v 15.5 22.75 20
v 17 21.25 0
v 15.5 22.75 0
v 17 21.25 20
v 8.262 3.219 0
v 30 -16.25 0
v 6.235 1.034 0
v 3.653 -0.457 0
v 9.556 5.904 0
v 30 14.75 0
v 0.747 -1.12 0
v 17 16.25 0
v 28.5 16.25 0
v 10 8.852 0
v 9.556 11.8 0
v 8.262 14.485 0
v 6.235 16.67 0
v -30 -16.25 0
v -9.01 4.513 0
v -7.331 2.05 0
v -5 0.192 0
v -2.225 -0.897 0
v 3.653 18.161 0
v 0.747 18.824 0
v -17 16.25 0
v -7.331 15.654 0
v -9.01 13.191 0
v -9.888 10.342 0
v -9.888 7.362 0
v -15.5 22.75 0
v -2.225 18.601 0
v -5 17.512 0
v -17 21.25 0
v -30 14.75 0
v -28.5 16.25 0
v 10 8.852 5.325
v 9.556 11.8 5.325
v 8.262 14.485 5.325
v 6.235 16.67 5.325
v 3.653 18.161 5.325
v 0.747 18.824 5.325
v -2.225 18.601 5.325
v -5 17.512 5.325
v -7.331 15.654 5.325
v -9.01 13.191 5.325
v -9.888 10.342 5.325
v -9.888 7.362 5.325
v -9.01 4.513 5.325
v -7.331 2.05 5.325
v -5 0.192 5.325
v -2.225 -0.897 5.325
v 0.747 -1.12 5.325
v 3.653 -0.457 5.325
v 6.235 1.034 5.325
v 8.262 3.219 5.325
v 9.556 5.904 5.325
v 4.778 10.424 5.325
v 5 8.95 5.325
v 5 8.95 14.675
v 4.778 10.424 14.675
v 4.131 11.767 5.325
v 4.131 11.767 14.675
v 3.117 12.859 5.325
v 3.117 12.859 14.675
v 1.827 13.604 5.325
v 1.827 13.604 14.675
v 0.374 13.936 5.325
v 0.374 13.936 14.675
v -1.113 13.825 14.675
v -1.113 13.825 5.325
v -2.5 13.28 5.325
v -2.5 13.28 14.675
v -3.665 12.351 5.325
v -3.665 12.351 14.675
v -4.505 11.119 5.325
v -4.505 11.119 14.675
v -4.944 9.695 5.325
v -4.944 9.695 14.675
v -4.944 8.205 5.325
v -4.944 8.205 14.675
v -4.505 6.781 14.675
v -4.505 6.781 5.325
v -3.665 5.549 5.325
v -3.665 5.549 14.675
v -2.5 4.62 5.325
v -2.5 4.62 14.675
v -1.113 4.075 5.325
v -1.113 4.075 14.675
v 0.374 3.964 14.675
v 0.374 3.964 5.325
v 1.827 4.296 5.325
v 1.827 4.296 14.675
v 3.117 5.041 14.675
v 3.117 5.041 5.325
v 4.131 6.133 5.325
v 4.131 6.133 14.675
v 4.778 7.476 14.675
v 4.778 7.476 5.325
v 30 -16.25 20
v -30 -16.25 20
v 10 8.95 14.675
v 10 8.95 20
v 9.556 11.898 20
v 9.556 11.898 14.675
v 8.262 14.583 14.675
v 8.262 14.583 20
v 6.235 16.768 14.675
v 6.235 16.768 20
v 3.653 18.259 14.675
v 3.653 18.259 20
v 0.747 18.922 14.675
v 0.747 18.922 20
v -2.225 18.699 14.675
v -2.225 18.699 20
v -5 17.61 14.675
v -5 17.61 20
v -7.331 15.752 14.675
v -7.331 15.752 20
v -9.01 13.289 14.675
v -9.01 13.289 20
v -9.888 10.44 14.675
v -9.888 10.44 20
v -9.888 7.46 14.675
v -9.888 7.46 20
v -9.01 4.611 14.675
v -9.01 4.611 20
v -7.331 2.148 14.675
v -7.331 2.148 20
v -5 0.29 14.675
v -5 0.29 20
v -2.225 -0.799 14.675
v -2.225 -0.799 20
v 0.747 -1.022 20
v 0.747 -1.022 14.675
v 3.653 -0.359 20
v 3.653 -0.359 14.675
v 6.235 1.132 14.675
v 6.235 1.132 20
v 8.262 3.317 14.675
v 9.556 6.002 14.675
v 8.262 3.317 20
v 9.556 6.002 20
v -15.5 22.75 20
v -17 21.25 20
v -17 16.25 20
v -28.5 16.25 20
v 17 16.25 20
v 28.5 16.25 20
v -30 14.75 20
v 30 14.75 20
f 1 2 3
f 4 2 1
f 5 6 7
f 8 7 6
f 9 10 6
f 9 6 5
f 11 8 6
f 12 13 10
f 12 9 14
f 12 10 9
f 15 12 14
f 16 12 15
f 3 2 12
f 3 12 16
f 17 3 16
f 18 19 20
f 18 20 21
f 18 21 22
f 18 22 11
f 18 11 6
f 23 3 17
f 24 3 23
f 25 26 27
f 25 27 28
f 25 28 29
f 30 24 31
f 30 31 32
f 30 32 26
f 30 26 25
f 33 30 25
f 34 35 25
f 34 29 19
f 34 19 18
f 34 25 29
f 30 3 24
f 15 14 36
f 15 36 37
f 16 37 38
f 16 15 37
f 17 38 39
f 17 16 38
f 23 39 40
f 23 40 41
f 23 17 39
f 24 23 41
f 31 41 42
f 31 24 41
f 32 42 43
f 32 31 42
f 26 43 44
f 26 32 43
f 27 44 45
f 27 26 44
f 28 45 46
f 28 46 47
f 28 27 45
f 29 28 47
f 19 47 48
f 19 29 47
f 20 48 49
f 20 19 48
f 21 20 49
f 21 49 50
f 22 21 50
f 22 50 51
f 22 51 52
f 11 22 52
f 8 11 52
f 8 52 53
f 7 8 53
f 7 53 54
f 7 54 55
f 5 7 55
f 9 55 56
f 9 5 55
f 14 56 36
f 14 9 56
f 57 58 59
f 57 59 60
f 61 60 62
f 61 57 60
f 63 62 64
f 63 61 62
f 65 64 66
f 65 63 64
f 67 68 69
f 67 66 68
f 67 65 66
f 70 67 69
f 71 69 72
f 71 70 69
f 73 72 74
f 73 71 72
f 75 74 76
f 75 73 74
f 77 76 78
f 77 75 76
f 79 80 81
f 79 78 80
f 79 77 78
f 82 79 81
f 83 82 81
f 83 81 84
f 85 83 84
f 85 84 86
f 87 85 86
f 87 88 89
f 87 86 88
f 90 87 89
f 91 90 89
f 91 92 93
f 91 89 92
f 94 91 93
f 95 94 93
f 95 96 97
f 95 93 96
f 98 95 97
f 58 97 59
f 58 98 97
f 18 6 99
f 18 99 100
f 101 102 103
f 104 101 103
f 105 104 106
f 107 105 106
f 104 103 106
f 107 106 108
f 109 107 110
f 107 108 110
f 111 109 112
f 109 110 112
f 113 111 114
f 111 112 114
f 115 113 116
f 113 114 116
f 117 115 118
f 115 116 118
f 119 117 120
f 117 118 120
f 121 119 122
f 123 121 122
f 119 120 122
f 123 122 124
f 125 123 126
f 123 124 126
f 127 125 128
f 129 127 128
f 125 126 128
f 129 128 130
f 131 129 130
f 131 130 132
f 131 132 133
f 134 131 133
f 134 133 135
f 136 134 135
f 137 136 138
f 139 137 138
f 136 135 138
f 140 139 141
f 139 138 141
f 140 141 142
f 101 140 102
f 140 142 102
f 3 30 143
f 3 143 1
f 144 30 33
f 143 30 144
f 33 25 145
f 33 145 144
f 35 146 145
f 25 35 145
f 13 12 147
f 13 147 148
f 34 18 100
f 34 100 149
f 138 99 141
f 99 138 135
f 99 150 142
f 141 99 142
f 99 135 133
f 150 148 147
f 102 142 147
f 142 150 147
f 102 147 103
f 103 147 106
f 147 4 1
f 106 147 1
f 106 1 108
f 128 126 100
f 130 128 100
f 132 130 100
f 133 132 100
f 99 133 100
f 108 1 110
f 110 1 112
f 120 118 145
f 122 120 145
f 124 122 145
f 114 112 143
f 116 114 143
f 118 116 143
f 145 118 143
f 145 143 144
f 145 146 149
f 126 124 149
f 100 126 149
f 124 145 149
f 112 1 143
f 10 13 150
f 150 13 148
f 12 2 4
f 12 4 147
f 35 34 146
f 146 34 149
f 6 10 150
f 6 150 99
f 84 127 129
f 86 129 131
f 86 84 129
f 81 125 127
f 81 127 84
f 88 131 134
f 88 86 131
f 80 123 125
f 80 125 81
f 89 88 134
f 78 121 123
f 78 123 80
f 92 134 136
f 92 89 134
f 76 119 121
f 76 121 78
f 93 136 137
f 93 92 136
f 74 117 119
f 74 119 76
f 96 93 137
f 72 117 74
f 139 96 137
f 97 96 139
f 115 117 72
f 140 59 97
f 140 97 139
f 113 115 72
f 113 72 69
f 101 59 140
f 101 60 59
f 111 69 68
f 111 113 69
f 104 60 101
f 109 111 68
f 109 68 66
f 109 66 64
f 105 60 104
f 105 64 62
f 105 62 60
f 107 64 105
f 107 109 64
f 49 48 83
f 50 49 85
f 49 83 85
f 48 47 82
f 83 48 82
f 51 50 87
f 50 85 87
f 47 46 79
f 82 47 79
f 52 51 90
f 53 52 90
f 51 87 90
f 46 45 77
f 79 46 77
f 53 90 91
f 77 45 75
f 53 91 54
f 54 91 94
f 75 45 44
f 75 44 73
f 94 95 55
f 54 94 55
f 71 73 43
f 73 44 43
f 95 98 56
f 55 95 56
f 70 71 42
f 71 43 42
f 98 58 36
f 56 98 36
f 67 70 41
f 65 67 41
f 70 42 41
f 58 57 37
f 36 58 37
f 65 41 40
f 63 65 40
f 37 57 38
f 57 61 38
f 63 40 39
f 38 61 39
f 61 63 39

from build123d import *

# Parameters (mm, degrees)
SALIENTE_EXTRUIR1_DEPTH = 20
CROQUIS2_R              = 5
CORTAR_EXTRUIR1_DEPTH   = 21
CHAFL_N1_SIZE           = 1.5
CROQUIS3_R              = 10
CORTAR_EXTRUIR2_DEPTH   = 5.325
CROQUIS5_R              = 10
CORTAR_EXTRUIR3_DEPTH   = 5.325


with BuildPart() as part:
    # Croquis1 → Saliente-Extruir1 (new body)
    with BuildSketch(Plane.XY):
        Polygon((-30, 16.25), (-17, 16.25), (-17, 22.75), (17, 22.75), (17, 16.25), (30, 16.25), (30, -16.25), (-30, -16.25), align=None)
    extrude(amount=SALIENTE_EXTRUIR1_DEPTH)

    # Croquis2 → Cortar-Extruir1 (cut, through all)
    with BuildSketch(Plane.XY):
        with Locations((0, 8.95)):
            Circle(CROQUIS2_R)
    extrude(amount=CORTAR_EXTRUIR1_DEPTH, mode=Mode.SUBTRACT)

    # Chaflán1
    chafl_n1_edges = [part.edges().sort_by_distance(p)[0] for p in [
        (-30, 16.25, 10),
        (-17, 22.75, 10),
        (17, 22.75, 10),
        (30, 16.25, 10),
    ]]
    chamfer(chafl_n1_edges, length=CHAFL_N1_SIZE)

    # Croquis3 → Cortar-Extruir2 (cut)
    with BuildSketch(Plane.XY):
        with Locations((0, 8.851953405)):
            Circle(CROQUIS3_R)
    extrude(amount=CORTAR_EXTRUIR2_DEPTH, mode=Mode.SUBTRACT)

    # Croquis5 → Cortar-Extruir3 (cut)
    with BuildSketch(Plane.XY.offset(20)):
        with Locations((0, 8.95)):
            Circle(CROQUIS5_R)
    extrude(amount=-CORTAR_EXTRUIR3_DEPTH, mode=Mode.SUBTRACT)


solid = part.part
